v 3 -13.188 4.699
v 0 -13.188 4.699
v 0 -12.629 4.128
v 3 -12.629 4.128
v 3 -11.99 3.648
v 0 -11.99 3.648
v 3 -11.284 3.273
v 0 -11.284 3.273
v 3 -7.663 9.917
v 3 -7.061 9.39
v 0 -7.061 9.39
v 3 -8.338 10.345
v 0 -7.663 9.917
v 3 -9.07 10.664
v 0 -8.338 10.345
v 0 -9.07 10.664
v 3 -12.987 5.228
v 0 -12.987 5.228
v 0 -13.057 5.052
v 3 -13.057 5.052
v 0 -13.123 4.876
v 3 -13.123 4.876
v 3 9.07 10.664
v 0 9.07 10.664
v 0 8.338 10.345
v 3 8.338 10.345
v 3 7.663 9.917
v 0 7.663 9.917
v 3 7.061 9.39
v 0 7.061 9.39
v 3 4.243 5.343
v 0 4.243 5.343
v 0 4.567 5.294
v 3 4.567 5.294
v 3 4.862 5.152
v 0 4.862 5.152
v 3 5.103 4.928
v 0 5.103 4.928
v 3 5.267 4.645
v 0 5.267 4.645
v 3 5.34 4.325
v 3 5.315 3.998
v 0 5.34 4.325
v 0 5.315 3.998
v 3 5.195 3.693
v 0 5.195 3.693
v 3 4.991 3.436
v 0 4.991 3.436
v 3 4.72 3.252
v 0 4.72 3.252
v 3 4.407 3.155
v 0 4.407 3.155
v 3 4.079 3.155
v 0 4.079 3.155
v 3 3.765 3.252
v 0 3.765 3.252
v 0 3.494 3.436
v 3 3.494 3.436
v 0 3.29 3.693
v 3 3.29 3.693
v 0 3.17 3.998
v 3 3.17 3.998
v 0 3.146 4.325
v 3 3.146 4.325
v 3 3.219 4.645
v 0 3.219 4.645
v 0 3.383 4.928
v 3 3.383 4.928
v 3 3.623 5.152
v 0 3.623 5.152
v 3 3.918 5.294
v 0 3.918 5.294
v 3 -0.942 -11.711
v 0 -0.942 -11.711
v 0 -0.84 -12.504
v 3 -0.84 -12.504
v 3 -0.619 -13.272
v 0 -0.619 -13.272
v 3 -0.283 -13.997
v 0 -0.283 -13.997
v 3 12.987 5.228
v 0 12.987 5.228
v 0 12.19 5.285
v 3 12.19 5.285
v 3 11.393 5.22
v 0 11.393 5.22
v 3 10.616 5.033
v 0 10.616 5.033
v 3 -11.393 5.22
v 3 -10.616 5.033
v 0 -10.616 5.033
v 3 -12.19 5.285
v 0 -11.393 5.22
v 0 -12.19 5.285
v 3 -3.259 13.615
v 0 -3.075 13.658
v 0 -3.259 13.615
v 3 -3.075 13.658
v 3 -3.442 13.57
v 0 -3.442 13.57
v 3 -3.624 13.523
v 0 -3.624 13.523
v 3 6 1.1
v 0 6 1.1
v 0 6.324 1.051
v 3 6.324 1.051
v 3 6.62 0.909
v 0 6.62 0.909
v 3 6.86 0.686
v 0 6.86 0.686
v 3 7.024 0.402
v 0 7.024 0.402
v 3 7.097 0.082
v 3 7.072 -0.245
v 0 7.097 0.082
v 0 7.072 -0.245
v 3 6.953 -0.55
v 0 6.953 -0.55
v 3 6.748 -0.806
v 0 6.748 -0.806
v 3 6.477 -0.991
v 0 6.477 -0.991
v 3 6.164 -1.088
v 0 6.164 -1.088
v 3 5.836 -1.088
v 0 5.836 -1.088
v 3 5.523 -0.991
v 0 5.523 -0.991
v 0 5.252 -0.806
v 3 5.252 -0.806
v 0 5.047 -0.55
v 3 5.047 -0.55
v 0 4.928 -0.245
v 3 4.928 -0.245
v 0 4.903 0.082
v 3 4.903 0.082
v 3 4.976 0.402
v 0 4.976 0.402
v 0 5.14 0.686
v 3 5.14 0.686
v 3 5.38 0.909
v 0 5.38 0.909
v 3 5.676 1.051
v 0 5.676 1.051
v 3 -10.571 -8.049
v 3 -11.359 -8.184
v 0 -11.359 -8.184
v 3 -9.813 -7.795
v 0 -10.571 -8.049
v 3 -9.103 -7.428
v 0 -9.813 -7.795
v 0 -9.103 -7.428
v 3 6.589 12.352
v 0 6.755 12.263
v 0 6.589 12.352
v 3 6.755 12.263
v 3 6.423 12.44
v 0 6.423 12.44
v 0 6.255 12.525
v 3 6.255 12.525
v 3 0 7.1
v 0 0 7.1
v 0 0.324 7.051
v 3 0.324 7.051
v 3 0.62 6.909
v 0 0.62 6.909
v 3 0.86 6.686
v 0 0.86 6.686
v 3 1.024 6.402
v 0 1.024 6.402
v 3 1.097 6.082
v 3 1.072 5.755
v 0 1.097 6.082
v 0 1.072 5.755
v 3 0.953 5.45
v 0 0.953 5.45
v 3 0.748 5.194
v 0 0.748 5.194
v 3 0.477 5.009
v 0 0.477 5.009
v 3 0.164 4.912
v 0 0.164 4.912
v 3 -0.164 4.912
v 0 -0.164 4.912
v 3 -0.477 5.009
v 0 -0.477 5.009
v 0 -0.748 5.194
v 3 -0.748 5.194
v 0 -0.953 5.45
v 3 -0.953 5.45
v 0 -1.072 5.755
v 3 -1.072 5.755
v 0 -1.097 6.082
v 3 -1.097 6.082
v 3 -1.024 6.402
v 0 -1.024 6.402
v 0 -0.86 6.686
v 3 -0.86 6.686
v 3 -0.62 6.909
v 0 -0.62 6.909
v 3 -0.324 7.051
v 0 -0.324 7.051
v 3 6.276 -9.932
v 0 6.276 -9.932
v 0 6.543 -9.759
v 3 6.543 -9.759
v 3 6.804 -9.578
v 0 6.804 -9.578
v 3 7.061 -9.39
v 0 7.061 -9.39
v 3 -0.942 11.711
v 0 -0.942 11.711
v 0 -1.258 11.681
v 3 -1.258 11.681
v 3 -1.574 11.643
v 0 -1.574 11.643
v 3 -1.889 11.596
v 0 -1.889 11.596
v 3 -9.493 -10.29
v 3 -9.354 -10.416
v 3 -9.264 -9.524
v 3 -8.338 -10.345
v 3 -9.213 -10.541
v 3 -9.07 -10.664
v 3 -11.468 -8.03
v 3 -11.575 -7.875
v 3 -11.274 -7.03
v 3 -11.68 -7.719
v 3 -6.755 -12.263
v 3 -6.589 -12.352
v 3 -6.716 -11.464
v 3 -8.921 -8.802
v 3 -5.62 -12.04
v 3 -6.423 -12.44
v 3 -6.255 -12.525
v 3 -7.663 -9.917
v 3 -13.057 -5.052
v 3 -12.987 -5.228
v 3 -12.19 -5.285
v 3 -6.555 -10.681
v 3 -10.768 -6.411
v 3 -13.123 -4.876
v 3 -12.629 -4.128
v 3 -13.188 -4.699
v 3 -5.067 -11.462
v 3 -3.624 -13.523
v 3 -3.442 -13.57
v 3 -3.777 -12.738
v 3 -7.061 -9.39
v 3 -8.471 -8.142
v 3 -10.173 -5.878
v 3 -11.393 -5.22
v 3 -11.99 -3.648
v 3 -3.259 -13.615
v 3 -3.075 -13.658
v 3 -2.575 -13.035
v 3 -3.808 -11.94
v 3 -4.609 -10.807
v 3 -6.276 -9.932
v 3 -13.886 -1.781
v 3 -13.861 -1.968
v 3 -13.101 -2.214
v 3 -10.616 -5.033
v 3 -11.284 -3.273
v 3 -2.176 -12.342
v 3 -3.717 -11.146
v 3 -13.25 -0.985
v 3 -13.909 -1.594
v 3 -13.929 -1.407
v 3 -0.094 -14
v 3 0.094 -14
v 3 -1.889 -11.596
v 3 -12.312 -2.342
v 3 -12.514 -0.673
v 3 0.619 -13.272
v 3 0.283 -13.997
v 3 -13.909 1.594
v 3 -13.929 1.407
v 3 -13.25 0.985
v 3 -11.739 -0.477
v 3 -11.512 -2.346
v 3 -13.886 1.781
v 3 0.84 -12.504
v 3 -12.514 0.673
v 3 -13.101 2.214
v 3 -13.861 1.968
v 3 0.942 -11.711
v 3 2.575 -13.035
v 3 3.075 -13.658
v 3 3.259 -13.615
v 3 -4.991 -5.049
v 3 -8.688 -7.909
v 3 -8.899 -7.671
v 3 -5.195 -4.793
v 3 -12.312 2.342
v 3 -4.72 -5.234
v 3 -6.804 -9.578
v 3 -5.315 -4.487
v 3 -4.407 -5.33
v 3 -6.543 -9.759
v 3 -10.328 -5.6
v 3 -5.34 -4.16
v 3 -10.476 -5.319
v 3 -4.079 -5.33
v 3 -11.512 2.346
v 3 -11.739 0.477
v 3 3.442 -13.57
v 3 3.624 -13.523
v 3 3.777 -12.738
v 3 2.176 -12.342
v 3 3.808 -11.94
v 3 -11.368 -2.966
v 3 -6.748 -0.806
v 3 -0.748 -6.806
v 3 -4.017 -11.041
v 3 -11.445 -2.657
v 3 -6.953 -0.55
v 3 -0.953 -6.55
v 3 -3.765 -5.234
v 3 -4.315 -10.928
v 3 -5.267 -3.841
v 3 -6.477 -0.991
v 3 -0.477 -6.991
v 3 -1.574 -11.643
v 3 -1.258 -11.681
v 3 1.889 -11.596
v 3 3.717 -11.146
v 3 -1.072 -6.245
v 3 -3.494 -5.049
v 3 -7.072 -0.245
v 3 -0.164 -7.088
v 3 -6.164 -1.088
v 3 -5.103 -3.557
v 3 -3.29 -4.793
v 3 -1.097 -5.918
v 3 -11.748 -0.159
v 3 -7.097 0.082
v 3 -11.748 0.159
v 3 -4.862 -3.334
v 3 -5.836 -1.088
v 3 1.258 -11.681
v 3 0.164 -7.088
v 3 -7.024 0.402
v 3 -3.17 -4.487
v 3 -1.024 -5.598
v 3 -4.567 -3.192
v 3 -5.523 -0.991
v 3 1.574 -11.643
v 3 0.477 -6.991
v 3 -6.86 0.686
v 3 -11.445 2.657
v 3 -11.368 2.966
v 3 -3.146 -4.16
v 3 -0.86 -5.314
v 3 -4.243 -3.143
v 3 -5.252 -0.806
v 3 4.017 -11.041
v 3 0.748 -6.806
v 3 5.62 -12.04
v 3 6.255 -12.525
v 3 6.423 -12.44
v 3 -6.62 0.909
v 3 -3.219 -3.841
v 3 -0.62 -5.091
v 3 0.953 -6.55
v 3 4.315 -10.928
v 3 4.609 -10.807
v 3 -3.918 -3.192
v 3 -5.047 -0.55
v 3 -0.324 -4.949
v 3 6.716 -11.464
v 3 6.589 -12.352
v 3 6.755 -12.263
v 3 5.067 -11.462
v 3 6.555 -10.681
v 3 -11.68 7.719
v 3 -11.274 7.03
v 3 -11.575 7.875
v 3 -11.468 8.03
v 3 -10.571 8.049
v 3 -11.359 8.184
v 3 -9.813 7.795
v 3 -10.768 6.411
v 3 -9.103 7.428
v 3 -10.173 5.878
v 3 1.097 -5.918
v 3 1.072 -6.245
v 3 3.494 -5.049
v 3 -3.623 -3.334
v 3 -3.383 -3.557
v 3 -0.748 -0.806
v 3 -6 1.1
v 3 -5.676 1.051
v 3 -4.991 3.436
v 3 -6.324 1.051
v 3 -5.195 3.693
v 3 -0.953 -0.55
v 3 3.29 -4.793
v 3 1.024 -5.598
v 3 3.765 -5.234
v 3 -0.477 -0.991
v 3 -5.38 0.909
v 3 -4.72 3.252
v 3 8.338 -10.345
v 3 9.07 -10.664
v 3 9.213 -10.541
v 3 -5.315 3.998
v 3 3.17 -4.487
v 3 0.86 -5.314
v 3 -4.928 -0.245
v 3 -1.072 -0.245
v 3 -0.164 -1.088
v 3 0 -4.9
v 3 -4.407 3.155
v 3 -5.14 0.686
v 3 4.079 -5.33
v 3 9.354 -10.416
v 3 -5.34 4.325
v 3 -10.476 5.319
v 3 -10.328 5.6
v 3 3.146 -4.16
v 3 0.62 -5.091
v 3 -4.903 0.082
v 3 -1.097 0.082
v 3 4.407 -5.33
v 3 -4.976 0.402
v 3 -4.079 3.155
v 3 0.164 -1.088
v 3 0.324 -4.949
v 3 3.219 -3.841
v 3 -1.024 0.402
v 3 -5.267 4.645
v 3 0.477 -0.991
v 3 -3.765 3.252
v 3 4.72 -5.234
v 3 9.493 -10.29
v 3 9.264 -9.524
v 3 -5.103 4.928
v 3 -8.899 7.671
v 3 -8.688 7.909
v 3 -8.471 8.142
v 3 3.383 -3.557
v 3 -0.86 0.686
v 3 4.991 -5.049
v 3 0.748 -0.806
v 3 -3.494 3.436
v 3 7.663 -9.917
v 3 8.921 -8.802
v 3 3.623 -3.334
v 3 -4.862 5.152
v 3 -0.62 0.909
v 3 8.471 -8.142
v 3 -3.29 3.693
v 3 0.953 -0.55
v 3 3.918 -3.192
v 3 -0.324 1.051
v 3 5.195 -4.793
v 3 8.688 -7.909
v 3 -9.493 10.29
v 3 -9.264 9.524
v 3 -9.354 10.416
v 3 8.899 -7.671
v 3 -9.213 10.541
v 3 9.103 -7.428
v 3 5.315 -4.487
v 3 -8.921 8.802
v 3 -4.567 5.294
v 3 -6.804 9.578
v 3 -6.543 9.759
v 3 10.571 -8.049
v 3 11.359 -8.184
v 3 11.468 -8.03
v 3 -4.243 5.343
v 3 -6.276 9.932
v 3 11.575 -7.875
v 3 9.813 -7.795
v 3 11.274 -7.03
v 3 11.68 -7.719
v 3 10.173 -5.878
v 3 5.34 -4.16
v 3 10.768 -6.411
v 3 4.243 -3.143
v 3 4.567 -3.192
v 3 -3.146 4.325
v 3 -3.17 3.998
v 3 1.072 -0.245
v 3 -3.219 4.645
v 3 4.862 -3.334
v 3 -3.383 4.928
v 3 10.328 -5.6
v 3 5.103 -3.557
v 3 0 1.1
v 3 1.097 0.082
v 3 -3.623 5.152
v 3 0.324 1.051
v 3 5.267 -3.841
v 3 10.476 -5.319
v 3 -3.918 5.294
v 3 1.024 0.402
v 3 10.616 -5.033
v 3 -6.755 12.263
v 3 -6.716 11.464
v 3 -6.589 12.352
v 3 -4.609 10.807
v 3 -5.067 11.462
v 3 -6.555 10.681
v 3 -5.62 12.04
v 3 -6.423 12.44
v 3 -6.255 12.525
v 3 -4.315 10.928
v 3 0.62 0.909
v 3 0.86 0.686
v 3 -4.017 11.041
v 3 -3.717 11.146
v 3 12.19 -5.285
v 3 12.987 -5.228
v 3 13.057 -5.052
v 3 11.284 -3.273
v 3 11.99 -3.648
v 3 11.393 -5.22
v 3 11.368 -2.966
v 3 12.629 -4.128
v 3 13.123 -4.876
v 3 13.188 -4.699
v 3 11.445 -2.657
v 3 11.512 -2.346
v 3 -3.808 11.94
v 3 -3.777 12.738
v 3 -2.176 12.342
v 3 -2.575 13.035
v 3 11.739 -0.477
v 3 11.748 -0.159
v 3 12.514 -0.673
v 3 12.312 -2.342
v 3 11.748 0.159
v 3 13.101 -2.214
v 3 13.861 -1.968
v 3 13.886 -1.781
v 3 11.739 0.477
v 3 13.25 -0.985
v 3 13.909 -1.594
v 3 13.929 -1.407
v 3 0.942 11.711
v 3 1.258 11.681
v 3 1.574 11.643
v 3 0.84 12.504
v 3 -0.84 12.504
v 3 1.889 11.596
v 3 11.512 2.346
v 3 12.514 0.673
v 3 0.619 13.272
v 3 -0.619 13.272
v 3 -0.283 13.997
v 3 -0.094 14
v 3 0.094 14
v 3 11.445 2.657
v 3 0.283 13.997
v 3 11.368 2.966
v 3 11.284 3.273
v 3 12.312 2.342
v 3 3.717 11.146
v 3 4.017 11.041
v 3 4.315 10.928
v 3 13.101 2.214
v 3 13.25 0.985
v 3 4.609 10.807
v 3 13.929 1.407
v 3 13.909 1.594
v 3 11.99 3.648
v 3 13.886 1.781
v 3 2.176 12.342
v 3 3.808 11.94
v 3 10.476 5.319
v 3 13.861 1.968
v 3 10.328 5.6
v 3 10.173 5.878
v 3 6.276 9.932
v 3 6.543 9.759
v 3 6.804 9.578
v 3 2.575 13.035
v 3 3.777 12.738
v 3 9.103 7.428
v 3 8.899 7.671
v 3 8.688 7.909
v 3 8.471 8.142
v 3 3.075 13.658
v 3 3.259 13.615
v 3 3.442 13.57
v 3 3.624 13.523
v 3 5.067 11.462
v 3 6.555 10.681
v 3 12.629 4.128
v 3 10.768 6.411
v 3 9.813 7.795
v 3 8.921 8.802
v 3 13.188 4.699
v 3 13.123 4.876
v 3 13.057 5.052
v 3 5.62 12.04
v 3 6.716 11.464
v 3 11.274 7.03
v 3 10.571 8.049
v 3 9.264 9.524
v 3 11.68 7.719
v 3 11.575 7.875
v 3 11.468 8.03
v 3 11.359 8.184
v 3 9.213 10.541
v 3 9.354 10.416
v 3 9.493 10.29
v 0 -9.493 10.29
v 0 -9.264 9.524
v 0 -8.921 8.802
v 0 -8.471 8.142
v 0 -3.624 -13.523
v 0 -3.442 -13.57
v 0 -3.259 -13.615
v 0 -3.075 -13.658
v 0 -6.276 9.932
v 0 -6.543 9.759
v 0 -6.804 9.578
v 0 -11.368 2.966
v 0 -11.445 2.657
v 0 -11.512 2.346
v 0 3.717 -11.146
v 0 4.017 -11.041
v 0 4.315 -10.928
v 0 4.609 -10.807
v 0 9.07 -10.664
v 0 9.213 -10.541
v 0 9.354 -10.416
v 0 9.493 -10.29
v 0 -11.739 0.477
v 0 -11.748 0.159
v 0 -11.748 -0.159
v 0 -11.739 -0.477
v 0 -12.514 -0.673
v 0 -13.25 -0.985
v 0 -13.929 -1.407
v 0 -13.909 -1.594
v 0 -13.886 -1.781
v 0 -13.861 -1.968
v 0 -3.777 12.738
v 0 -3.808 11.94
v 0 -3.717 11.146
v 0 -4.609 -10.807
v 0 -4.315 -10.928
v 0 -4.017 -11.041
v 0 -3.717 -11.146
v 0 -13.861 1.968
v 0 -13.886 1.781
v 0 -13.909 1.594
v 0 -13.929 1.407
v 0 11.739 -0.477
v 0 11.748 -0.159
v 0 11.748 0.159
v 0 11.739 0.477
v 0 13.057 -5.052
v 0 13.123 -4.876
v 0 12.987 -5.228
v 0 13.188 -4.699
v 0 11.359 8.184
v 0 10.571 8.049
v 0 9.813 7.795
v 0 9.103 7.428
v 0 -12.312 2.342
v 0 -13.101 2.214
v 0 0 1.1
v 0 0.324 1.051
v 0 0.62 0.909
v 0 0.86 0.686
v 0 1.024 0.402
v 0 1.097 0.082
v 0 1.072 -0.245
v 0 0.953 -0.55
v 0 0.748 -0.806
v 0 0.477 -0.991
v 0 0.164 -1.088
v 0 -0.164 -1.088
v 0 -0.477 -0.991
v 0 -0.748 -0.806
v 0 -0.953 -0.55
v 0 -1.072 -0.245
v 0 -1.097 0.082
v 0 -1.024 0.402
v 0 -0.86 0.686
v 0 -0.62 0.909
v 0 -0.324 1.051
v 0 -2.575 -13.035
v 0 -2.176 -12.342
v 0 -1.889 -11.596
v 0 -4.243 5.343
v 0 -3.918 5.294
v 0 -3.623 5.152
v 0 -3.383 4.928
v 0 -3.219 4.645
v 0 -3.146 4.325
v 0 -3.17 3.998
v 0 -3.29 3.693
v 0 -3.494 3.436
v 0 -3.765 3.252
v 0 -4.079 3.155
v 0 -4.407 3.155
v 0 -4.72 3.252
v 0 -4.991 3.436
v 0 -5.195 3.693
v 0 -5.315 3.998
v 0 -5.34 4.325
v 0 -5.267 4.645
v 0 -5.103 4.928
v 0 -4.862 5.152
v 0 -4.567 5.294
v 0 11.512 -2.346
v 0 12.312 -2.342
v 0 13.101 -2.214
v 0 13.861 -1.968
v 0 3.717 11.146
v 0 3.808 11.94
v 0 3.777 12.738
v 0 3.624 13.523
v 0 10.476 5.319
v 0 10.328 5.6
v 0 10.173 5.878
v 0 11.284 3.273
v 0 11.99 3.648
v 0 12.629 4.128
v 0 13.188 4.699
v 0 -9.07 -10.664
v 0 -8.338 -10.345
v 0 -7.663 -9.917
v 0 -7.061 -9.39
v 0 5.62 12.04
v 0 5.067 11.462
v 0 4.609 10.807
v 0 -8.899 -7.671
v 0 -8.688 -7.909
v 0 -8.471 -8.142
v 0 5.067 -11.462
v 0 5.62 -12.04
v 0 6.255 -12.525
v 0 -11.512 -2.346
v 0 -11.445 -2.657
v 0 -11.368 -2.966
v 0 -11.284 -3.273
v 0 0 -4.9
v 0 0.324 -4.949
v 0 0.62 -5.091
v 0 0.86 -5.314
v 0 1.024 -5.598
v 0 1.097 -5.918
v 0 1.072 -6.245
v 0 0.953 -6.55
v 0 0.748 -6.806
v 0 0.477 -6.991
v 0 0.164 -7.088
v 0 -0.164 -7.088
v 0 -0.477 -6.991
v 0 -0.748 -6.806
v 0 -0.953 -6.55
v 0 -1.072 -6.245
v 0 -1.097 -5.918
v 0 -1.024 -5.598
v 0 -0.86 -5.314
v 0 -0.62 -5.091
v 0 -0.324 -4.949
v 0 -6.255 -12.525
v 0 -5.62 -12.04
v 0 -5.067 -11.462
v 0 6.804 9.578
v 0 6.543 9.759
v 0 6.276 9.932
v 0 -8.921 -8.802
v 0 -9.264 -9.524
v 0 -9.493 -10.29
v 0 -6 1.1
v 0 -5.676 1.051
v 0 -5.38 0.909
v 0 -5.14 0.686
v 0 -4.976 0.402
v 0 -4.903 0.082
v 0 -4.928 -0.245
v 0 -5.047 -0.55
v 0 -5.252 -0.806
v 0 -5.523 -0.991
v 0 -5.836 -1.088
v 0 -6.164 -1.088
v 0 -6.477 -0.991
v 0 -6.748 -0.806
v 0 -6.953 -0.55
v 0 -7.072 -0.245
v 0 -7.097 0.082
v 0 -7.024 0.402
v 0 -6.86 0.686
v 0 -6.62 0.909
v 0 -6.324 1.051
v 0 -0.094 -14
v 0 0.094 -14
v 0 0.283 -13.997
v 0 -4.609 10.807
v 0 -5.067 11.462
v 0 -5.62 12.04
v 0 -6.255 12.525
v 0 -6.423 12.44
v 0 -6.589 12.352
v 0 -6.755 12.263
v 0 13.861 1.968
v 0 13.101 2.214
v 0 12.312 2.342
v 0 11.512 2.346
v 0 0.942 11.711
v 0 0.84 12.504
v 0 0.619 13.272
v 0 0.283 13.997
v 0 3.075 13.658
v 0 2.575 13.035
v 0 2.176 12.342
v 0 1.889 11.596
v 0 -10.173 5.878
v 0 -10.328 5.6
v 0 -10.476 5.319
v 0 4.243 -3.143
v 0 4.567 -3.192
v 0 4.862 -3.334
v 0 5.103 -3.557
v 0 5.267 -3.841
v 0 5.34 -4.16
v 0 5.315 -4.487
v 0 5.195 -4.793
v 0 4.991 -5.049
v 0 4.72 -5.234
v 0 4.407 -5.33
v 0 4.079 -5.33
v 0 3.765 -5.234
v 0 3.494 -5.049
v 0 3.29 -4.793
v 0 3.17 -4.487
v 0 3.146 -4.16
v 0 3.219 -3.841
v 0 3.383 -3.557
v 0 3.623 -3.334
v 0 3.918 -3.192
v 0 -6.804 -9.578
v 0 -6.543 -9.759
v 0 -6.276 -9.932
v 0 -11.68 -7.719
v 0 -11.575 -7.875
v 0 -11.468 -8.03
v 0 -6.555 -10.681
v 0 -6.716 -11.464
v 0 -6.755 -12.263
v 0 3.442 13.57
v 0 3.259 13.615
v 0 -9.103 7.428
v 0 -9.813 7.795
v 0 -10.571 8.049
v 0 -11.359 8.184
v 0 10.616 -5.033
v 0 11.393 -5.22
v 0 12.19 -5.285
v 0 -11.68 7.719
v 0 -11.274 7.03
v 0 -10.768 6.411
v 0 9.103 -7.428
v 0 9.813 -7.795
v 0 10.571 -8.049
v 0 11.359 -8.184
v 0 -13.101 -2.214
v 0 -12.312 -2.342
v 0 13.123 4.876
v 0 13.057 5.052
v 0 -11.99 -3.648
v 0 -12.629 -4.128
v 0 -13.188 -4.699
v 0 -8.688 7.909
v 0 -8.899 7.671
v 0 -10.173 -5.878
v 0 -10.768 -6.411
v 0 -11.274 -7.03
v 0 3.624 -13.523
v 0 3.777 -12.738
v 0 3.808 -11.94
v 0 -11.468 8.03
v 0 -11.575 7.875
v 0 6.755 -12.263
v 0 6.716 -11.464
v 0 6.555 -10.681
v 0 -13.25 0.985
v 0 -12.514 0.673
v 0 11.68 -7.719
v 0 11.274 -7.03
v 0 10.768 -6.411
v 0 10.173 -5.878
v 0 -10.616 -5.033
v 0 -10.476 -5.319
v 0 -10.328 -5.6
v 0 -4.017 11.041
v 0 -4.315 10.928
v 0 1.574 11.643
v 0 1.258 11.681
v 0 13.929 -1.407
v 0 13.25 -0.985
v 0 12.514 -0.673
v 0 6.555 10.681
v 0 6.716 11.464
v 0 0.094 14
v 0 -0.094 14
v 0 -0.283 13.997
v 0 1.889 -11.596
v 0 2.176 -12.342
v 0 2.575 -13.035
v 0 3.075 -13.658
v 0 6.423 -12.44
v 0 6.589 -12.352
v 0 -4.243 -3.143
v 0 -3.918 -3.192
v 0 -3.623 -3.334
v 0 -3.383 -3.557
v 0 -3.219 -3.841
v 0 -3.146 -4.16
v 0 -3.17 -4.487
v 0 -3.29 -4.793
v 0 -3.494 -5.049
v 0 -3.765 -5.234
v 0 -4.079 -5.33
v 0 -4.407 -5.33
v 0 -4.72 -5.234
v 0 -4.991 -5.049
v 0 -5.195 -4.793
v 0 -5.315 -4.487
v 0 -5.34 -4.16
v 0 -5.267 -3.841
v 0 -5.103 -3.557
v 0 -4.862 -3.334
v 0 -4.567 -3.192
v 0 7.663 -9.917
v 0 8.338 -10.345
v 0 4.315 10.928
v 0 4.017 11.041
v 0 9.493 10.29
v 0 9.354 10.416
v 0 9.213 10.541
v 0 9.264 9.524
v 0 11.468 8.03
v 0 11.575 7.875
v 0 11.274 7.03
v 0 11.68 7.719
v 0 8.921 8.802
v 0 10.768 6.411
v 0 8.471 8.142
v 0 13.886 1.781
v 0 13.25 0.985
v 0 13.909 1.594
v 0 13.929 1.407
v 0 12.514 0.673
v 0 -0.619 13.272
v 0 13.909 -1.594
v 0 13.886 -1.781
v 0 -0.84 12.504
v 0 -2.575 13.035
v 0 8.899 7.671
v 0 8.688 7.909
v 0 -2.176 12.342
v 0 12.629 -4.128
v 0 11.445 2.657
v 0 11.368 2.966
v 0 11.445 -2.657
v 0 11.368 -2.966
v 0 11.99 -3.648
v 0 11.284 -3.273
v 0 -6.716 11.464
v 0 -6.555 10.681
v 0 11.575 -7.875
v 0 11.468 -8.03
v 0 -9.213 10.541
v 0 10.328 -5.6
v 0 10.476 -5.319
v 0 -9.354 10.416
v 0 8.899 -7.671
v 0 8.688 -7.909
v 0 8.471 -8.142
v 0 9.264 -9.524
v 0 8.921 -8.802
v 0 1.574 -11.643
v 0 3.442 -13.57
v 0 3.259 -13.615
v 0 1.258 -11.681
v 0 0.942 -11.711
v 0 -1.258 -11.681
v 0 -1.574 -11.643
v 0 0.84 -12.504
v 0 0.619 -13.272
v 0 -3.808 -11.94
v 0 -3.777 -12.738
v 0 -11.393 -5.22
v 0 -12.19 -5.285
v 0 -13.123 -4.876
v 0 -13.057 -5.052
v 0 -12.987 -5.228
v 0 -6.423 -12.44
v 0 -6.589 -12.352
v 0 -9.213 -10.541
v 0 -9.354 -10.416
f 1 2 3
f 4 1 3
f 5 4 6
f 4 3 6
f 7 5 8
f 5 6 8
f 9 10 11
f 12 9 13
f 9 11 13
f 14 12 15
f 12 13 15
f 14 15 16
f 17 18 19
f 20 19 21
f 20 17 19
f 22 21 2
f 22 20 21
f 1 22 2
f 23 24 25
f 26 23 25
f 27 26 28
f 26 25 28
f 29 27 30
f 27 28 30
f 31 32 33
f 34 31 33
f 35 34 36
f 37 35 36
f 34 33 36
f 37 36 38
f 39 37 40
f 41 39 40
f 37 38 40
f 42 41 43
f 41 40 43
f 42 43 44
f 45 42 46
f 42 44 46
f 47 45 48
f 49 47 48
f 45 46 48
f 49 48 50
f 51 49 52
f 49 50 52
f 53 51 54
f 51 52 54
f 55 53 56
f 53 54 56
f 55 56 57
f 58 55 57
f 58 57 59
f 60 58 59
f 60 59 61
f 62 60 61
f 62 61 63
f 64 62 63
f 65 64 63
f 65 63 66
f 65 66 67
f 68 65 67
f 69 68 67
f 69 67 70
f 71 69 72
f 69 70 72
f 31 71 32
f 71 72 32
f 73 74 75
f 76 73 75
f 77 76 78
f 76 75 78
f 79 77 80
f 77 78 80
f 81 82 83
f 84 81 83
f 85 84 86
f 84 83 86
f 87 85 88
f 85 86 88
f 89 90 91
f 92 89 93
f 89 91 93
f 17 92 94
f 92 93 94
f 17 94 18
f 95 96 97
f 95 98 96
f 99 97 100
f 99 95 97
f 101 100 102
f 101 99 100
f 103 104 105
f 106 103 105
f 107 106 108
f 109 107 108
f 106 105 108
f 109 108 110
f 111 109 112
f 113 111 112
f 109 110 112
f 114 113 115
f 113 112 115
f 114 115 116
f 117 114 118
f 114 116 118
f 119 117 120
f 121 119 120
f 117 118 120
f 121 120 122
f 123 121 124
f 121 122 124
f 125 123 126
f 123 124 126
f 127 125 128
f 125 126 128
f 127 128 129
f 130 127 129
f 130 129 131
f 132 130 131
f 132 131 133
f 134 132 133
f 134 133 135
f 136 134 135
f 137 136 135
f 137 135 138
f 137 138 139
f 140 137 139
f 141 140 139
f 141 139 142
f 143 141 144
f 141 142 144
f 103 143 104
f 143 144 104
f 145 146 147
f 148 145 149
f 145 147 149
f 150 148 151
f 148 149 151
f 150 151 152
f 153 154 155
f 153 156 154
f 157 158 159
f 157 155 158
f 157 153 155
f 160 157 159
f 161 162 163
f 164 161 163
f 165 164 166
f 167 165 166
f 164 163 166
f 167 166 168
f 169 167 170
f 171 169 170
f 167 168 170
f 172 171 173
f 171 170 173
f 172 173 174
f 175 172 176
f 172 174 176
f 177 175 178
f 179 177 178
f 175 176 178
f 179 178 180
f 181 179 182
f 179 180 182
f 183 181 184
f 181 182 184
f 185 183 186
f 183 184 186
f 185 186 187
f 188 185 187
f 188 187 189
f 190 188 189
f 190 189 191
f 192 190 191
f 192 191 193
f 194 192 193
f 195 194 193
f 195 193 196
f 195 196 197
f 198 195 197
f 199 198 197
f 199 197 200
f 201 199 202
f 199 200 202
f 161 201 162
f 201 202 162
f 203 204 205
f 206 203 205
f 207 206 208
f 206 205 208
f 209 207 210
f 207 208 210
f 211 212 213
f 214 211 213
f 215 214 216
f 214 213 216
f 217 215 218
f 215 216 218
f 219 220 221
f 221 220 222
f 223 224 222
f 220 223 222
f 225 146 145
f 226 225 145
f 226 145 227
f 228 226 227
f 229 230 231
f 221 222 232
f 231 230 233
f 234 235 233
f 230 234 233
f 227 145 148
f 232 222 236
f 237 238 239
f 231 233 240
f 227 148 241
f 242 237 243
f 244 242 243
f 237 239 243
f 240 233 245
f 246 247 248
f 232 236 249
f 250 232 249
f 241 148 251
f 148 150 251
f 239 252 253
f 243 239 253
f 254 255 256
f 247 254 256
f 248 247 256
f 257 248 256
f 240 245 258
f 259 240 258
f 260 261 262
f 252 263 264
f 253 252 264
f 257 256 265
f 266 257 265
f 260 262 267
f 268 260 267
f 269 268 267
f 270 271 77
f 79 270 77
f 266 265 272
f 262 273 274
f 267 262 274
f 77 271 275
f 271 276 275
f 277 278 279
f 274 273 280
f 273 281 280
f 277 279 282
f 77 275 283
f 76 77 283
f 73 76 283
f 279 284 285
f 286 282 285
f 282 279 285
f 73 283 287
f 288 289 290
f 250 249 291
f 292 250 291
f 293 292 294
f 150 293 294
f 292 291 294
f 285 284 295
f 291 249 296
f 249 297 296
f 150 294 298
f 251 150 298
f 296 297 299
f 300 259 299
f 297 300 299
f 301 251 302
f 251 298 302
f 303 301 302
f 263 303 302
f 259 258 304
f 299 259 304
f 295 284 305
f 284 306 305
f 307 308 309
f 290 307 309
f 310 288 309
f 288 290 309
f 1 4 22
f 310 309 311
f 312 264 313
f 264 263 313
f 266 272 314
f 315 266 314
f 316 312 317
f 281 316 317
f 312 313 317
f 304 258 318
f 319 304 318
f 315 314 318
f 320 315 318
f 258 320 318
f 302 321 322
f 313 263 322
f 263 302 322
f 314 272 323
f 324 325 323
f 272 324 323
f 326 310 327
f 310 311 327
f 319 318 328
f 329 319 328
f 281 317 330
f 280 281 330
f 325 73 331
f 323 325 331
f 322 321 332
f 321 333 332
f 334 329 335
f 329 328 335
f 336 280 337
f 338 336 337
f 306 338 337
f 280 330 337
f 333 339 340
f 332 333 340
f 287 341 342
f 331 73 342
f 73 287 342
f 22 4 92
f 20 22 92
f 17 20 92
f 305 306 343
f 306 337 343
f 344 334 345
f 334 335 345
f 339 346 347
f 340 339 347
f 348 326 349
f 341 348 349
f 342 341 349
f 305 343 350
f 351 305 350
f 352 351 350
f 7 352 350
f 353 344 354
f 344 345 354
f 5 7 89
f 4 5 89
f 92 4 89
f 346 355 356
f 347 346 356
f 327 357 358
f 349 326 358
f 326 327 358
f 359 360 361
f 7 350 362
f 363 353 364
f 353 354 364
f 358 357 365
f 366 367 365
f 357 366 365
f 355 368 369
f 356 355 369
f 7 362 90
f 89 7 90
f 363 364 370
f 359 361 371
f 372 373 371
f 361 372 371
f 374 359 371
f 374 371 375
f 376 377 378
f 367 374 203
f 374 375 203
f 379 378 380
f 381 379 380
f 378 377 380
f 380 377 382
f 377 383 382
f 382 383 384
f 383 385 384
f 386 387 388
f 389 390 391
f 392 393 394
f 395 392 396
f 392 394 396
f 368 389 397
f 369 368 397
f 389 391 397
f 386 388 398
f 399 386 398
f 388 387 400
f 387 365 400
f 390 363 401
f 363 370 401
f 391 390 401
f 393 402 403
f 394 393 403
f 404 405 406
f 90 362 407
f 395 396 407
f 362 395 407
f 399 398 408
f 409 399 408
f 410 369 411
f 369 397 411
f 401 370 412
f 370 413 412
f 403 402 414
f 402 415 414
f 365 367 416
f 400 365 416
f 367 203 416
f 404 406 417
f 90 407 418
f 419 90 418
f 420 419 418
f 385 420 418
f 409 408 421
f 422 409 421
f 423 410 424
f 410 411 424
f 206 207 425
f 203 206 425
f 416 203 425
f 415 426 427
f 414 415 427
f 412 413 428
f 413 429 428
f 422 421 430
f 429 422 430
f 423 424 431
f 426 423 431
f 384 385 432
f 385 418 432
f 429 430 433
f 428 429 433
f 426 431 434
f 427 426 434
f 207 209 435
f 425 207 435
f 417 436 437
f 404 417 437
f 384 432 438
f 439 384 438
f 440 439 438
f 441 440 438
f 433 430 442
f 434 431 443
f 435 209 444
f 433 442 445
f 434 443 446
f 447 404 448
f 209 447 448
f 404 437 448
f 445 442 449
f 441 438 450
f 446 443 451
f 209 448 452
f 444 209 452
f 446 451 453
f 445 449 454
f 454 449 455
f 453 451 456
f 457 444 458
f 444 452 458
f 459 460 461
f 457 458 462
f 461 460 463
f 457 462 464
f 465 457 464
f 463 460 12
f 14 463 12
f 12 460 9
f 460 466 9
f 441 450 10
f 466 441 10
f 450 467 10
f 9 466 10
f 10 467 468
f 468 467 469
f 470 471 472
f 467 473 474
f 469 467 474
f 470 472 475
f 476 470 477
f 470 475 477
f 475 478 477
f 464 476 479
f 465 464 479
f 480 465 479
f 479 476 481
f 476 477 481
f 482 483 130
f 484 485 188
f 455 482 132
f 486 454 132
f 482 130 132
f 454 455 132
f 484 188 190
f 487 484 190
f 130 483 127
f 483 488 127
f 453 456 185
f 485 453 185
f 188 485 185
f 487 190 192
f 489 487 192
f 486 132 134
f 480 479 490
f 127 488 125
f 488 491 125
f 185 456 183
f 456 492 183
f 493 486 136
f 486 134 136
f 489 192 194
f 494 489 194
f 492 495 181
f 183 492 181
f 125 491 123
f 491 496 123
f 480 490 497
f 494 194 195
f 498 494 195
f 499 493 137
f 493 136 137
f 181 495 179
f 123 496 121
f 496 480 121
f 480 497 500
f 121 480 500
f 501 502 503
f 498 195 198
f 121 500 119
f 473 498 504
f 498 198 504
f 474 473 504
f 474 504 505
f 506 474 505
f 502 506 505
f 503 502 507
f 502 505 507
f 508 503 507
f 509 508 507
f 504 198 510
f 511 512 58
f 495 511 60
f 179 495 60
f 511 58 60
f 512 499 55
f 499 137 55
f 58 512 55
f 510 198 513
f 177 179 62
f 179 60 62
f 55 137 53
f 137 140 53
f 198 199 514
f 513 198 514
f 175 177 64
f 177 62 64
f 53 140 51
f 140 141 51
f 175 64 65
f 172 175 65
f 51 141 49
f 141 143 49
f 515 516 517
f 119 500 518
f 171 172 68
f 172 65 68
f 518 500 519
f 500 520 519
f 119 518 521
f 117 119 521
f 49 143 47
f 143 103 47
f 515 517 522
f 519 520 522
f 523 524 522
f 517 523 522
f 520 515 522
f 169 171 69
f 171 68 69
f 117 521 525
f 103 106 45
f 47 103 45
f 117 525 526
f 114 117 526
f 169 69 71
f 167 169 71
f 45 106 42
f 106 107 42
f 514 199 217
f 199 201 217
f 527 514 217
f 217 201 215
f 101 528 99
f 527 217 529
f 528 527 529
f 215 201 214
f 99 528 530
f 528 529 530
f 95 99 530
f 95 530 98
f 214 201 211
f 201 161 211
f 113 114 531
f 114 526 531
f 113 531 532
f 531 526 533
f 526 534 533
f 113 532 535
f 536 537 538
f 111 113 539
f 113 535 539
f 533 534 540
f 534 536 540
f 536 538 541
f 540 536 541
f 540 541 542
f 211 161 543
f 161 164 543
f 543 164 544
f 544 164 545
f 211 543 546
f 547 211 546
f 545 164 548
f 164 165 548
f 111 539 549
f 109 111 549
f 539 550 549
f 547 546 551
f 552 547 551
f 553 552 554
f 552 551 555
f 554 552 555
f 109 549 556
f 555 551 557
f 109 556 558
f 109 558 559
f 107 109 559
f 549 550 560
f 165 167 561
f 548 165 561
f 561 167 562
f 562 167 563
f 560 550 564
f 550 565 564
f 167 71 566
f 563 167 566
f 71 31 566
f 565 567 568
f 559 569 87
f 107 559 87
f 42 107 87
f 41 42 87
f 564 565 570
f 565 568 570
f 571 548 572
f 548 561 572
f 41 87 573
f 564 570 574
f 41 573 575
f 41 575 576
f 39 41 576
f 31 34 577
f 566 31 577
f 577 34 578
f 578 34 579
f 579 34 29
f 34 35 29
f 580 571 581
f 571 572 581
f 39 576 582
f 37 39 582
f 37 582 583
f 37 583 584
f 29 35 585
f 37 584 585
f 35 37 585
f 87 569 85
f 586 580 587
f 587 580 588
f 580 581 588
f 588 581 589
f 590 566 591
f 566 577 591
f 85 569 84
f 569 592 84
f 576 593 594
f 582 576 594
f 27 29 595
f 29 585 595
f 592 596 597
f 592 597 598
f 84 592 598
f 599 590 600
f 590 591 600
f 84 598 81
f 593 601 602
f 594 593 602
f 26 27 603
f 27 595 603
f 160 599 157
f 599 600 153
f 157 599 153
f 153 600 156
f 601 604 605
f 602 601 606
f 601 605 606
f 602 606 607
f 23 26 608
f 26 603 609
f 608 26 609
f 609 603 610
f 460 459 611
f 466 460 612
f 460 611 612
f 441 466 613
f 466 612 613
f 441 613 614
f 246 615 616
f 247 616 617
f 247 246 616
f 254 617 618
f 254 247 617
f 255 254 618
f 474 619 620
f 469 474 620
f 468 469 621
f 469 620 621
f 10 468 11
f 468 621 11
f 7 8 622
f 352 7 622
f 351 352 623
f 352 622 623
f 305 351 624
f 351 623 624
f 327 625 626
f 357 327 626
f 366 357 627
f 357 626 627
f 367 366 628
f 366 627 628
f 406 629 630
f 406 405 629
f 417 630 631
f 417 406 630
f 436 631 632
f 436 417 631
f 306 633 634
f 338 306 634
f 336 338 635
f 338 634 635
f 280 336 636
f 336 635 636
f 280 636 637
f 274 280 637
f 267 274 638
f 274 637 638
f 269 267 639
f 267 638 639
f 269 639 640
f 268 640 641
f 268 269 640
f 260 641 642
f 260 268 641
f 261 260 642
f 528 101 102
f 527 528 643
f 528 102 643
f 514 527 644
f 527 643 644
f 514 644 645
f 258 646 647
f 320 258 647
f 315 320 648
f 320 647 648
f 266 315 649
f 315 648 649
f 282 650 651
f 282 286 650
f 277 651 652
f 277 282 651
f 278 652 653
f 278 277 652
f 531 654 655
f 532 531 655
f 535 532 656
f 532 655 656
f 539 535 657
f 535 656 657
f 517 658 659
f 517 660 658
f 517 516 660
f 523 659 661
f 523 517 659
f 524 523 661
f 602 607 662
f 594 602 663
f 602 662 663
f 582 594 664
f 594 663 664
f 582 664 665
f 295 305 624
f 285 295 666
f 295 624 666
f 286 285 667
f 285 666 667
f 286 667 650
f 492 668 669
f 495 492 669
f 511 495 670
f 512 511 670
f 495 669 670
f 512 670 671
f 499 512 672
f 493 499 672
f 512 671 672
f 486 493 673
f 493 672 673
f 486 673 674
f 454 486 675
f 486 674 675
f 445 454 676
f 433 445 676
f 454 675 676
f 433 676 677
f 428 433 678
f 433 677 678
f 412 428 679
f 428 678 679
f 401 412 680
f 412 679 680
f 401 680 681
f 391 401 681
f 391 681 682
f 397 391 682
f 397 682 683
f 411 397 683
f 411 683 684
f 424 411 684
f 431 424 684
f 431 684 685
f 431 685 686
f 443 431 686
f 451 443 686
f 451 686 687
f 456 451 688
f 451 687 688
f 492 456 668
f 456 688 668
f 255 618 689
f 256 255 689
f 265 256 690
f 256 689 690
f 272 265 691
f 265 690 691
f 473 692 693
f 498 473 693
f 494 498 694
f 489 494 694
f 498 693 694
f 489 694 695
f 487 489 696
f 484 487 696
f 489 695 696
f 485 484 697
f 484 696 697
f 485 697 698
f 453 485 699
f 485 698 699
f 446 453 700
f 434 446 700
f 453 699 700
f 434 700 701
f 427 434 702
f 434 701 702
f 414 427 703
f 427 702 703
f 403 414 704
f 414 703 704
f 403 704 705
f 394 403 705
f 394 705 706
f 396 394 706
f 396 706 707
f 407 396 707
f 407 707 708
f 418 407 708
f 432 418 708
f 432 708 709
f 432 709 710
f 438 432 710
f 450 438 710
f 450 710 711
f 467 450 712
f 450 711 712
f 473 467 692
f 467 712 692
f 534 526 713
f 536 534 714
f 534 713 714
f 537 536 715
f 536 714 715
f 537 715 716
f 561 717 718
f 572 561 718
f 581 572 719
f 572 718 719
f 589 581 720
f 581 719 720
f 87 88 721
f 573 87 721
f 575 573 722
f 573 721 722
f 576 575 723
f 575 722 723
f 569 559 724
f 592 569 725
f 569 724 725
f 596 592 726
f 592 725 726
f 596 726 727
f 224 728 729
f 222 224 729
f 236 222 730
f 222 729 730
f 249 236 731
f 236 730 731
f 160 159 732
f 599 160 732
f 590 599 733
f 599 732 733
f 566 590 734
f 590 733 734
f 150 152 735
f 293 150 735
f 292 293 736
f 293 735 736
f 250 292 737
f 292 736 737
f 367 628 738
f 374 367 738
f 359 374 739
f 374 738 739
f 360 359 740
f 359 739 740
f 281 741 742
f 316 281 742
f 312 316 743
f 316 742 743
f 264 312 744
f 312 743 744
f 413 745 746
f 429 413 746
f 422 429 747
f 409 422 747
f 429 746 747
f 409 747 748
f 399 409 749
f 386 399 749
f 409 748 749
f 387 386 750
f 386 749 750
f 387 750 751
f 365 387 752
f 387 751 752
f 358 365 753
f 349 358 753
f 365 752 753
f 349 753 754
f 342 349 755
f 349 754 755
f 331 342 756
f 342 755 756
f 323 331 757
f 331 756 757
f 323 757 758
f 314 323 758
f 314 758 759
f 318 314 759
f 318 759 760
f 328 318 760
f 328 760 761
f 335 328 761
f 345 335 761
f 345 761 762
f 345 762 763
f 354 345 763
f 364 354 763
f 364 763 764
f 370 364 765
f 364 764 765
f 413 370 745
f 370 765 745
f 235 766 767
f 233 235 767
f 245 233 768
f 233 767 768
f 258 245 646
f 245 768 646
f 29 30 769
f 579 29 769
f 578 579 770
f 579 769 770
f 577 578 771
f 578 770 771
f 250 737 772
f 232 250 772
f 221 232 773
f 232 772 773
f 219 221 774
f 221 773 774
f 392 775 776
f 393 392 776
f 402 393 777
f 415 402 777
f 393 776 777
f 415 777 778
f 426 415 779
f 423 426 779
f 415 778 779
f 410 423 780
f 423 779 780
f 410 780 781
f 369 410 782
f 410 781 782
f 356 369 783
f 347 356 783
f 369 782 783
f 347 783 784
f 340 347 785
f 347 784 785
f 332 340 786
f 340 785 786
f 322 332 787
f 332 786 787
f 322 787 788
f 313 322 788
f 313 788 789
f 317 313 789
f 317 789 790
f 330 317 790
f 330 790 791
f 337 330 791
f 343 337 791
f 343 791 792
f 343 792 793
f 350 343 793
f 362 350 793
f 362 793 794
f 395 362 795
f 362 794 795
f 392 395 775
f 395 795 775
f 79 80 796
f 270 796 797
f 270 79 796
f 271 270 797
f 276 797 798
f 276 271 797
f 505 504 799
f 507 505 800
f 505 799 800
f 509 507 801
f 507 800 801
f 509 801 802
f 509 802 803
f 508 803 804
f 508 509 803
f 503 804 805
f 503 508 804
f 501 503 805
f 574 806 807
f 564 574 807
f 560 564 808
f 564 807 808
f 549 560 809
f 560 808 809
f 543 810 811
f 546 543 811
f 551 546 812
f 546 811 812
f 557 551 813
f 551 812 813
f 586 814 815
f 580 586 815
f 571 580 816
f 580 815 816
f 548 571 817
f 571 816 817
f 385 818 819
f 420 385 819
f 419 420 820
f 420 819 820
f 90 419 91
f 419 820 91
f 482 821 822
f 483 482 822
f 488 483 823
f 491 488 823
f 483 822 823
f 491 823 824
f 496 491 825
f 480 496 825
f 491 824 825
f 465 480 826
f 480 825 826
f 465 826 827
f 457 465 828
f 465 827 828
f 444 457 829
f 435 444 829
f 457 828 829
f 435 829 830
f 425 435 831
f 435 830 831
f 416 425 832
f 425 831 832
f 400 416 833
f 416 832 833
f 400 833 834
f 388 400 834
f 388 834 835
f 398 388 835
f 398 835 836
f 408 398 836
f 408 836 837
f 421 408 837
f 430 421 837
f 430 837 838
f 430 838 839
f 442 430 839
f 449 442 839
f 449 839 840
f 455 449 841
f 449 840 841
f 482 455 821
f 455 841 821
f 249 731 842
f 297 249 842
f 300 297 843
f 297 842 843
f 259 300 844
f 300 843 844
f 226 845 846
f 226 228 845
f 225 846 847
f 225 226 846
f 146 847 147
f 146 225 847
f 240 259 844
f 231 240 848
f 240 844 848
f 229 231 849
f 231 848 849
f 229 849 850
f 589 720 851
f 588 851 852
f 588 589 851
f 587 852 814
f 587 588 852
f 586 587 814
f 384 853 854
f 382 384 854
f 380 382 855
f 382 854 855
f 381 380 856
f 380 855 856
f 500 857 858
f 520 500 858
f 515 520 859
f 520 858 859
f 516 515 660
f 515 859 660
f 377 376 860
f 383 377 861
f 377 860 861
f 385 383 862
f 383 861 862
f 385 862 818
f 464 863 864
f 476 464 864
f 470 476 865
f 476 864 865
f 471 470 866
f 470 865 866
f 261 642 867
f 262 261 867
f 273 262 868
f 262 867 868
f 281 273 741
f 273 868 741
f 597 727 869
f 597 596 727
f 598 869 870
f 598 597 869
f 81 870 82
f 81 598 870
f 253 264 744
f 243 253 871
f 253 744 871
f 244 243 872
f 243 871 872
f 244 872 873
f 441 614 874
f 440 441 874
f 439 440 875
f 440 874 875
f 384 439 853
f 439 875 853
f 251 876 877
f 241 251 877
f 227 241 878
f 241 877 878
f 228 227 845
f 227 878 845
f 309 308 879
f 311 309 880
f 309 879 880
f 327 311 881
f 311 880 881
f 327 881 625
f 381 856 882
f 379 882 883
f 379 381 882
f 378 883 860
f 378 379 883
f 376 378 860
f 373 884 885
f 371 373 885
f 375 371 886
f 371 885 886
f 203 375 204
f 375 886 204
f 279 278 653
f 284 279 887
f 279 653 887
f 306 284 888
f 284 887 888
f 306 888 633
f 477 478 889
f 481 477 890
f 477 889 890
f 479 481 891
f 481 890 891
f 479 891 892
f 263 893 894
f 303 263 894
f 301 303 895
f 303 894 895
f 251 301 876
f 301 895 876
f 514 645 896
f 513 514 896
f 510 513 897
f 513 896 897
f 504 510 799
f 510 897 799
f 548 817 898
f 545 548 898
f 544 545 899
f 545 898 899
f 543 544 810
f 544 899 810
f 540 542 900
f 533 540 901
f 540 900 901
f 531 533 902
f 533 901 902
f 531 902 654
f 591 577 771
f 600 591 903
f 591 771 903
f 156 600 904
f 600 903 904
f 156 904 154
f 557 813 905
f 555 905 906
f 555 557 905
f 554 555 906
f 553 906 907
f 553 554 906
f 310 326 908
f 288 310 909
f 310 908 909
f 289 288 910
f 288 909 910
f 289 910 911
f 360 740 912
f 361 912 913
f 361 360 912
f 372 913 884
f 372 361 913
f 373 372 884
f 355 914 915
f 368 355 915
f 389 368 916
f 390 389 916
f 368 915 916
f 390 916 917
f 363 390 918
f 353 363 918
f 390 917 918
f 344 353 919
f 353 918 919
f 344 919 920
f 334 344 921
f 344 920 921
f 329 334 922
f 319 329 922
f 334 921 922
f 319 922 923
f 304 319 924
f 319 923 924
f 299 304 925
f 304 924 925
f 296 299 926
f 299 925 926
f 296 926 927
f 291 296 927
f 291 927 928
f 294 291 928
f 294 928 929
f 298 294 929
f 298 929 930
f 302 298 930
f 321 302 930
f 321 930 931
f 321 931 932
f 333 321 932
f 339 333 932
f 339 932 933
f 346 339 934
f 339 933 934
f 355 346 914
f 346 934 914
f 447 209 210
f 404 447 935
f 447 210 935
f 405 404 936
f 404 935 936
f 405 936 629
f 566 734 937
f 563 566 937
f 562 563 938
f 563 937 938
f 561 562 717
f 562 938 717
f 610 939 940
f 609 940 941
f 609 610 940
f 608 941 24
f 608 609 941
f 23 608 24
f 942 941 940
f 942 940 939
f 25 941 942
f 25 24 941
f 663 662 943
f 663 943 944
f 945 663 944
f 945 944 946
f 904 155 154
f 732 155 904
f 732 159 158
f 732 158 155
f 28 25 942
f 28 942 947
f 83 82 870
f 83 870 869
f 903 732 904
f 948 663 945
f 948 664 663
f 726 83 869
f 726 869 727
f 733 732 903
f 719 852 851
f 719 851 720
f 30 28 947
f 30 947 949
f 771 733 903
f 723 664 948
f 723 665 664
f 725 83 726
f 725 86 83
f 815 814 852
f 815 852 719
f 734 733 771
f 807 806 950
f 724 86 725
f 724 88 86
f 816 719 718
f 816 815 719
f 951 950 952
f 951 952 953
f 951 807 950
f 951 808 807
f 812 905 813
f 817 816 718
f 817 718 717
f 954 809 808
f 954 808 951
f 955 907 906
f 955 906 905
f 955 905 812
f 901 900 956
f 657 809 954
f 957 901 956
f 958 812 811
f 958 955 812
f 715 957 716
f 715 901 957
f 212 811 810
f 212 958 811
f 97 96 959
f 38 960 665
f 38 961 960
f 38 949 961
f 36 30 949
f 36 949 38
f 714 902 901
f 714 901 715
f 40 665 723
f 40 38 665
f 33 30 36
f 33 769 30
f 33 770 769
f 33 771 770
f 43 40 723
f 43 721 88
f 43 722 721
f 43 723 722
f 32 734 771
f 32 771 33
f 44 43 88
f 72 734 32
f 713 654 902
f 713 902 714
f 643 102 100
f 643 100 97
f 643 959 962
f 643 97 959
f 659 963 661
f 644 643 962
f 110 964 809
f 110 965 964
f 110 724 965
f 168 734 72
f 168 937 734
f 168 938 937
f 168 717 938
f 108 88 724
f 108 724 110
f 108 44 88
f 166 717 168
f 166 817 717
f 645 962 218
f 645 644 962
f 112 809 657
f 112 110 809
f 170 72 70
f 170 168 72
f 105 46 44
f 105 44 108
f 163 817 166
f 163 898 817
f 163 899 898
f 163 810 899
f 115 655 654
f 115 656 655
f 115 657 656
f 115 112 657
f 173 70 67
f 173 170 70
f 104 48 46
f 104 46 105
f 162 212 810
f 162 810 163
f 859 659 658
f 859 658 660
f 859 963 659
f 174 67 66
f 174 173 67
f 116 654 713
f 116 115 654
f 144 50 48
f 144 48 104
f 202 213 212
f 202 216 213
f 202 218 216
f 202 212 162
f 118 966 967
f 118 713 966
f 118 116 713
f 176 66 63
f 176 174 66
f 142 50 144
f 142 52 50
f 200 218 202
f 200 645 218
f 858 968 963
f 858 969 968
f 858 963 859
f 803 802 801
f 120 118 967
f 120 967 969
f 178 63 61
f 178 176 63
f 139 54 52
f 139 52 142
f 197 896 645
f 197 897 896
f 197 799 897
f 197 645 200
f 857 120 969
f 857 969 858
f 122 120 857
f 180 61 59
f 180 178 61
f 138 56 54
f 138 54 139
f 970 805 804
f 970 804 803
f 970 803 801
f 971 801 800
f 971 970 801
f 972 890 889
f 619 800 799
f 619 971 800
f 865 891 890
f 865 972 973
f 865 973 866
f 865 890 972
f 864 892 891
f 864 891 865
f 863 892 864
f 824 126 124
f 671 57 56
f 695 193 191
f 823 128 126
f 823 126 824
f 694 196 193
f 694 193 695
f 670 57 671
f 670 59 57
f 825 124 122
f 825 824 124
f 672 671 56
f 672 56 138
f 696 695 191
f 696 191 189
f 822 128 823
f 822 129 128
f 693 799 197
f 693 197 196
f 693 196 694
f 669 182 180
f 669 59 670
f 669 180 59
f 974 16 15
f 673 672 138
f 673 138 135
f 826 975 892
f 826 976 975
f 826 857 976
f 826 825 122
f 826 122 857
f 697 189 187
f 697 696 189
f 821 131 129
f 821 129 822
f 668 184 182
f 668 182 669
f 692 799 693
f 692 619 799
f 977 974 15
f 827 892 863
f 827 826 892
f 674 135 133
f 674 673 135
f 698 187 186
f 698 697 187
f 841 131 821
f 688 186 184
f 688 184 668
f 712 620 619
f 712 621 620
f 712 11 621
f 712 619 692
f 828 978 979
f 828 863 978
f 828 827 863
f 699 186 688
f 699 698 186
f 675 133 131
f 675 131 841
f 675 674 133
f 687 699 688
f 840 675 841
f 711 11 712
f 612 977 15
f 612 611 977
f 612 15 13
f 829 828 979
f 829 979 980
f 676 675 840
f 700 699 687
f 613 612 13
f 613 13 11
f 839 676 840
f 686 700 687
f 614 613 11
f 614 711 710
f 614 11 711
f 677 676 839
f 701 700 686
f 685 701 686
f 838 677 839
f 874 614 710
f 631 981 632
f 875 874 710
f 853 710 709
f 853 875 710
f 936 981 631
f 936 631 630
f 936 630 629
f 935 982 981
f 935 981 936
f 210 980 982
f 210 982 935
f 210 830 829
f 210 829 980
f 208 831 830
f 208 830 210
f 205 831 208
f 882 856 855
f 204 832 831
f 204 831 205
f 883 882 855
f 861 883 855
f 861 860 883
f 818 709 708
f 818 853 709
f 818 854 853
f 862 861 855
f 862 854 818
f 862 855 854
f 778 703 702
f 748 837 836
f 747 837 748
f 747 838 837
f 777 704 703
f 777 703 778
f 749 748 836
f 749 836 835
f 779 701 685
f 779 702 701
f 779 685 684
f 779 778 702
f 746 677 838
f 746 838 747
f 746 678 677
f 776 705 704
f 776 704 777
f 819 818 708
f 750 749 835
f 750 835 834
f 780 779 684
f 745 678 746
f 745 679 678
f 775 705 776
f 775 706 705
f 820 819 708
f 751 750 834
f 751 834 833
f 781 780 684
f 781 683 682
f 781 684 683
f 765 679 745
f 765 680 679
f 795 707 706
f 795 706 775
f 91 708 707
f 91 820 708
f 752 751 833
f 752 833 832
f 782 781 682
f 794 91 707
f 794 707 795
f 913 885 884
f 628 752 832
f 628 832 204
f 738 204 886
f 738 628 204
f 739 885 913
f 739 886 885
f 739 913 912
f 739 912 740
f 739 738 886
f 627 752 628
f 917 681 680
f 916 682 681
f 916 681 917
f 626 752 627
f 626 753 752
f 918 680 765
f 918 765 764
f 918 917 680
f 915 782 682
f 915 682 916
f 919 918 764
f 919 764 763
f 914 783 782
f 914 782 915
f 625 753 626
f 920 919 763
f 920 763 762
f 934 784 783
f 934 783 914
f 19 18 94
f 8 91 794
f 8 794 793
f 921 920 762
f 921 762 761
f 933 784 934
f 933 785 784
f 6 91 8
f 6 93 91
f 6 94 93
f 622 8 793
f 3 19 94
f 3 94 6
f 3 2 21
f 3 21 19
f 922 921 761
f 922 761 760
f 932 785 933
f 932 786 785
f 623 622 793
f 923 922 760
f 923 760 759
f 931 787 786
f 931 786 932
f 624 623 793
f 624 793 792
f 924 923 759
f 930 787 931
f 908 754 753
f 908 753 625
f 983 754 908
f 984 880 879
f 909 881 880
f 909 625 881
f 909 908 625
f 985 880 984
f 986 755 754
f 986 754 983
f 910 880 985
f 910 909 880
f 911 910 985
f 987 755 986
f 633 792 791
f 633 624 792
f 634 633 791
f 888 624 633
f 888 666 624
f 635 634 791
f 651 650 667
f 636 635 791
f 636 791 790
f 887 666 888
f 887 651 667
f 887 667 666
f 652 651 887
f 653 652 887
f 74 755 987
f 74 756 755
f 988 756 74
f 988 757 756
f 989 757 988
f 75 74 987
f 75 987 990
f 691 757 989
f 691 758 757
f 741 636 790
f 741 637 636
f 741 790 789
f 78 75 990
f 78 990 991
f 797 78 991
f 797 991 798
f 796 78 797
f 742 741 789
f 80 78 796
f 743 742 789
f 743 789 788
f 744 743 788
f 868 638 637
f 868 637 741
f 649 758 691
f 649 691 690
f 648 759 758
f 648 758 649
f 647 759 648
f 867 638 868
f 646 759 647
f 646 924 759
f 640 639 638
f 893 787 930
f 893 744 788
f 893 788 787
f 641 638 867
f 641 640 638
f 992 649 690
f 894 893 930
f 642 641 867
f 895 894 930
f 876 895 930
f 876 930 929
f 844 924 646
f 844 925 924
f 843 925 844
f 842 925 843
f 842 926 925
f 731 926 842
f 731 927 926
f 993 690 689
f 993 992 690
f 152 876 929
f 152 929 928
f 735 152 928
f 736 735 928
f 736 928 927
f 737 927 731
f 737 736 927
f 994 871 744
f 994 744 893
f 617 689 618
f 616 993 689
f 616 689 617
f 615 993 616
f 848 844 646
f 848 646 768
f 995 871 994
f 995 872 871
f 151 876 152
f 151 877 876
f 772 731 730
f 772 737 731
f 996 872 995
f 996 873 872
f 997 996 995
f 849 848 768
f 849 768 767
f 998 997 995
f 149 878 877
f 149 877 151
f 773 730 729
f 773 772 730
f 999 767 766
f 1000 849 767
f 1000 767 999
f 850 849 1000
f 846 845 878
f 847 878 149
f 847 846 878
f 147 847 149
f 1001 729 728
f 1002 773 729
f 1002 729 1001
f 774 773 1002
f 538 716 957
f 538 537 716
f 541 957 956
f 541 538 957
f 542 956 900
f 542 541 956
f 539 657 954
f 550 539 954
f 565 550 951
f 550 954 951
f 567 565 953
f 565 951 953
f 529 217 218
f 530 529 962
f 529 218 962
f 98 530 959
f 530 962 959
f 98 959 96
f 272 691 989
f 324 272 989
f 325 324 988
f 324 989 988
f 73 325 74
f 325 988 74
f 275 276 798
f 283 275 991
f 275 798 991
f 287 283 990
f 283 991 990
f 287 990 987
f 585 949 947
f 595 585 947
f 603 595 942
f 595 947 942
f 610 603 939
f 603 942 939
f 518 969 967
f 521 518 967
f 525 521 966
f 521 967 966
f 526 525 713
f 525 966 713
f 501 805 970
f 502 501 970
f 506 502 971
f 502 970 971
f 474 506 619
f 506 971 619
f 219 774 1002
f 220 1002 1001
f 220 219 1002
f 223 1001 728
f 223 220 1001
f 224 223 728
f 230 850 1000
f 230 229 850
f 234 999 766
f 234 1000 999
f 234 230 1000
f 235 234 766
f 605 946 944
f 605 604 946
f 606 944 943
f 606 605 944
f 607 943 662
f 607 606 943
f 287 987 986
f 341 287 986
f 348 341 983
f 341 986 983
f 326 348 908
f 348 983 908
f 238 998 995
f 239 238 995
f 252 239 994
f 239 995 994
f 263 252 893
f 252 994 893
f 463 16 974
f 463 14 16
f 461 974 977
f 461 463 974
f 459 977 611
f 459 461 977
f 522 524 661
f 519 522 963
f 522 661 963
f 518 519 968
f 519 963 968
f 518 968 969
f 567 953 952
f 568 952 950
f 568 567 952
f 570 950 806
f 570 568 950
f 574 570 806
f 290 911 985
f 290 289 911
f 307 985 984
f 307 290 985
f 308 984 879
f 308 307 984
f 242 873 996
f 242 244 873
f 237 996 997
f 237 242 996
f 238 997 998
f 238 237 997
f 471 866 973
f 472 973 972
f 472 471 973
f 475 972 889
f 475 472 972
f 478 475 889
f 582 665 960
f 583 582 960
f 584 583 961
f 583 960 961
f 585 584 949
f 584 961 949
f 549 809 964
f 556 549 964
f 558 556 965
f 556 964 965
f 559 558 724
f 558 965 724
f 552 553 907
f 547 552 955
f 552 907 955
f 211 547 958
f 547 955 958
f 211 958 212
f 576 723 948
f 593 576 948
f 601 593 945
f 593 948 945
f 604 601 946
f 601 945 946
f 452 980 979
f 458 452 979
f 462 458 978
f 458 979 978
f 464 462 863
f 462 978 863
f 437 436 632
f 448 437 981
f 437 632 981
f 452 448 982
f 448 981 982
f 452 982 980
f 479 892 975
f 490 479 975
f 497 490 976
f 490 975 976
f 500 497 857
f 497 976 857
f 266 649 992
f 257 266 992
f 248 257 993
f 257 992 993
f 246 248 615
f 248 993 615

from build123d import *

# Parameters (mm, degrees)
BASPROSKE_W         = 3
BASPROSKE_H         = 14
TOOTHCUT_DEPTH      = 21.024984395
TEETHCUTS_COUNT     = 26
TEETHCUTS_ANGLE     = 346.153846154
BORSKE_R            = 4
BORE_DEPTH          = 50.0000508
EXTRUDE_START       = -3
SKETCH_1_R          = 4
EXTRUDE_1_DEPTH     = 3
SKETCH_2_R          = 1.1
CUT_EXTRUDE_1_DEPTH = 3


with BuildPart() as part:
    # BasProSke → Base-Revolve (revolve)
    with BuildSketch(Plane(origin=(0, 0, 0), x_dir=(1, 0, 0), z_dir=(0, 1, 0)), mode=Mode.PRIVATE) as base_revolve_sk:
        with Locations((1.5, 7)):
            Rectangle(BASPROSKE_W, BASPROSKE_H)
    revolve(base_revolve_sk.sketch.rotate(Axis((-10, 0, 0), (1, 0, 0)), 180), axis=Axis((-10, 0, 0), (1, 0, 0)))

    # TooCutSke → ToothCut (cut, through all)
    with BuildSketch(Plane(origin=(0, 0, 0), x_dir=(0, 0, -1), z_dir=(1, 0, 0))):
        with BuildLine():
            ThreePointArc((0.476965065, 11.739314517), (0, 11.749), (-0.476965065, 11.739314517))
            ThreePointArc((-0.476965065, 11.739314517), (-0.82065865, 12.901686978), (-1.424117301, 13.952911348))
            ThreePointArc((-1.424117301, 13.952911348), (0, 14.0254), (1.424117301, 13.952911348))
            ThreePointArc((1.424117301, 13.952911348), (0.82065865, 12.901686978), (0.476965065, 11.739314517))
        make_face()
    toothcut = extrude(amount=TOOTHCUT_DEPTH, mode=Mode.SUBTRACT)

    # TeethCuts: ToothCut ×26 about axis
    teethcuts_axis = Axis((-10, 0, 0), (1, 0, 0))
    for i in range(1, TEETHCUTS_COUNT):
        add(toothcut.rotate(teethcuts_axis, i * TEETHCUTS_ANGLE / (TEETHCUTS_COUNT - 1)), mode=Mode.SUBTRACT)

    # BorSke → Bore (cut, symmetric)
    with BuildSketch(Plane(origin=(0, 0, 0), x_dir=(0, 0, -1), z_dir=(1, 0, 0))):
        with Locations(Location((0, 0, 0), (0, 0, 180))):
            Circle(BORSKE_R)
    extrude(amount=BORE_DEPTH, both=True, mode=Mode.SUBTRACT)

    # ｽｹｯﾁ1 → ﾎﾞｽ - 押し出し1 (add)
    with BuildSketch(Plane.ZY.offset(EXTRUDE_START)):
        Circle(SKETCH_1_R)
    extrude(amount=EXTRUDE_1_DEPTH)

    # ｽｹｯﾁ2 → ｶｯﾄ - 押し出し1 (cut)
    with BuildSketch(Plane.ZY):
        Circle(SKETCH_2_R)
        with Locations((0, 6)):
            Circle(SKETCH_2_R)
        with Locations((4.242640687, 4.242640687)):
            Circle(SKETCH_2_R)
        with Locations((6, 0)):
            Circle(SKETCH_2_R)
        with Locations((4.242640687, -4.242640687)):
            Circle(SKETCH_2_R)
        with Locations((0, -6)):
            Circle(SKETCH_2_R)
        with Locations((-4.242640687, -4.242640687)):
            Circle(SKETCH_2_R)
        with Locations((-6, 0)):
            Circle(SKETCH_2_R)
        with Locations((-4.242640687, 4.242640687)):
            Circle(SKETCH_2_R)
    extrude(amount=-CUT_EXTRUDE_1_DEPTH, mode=Mode.SUBTRACT)


solid = part.part
